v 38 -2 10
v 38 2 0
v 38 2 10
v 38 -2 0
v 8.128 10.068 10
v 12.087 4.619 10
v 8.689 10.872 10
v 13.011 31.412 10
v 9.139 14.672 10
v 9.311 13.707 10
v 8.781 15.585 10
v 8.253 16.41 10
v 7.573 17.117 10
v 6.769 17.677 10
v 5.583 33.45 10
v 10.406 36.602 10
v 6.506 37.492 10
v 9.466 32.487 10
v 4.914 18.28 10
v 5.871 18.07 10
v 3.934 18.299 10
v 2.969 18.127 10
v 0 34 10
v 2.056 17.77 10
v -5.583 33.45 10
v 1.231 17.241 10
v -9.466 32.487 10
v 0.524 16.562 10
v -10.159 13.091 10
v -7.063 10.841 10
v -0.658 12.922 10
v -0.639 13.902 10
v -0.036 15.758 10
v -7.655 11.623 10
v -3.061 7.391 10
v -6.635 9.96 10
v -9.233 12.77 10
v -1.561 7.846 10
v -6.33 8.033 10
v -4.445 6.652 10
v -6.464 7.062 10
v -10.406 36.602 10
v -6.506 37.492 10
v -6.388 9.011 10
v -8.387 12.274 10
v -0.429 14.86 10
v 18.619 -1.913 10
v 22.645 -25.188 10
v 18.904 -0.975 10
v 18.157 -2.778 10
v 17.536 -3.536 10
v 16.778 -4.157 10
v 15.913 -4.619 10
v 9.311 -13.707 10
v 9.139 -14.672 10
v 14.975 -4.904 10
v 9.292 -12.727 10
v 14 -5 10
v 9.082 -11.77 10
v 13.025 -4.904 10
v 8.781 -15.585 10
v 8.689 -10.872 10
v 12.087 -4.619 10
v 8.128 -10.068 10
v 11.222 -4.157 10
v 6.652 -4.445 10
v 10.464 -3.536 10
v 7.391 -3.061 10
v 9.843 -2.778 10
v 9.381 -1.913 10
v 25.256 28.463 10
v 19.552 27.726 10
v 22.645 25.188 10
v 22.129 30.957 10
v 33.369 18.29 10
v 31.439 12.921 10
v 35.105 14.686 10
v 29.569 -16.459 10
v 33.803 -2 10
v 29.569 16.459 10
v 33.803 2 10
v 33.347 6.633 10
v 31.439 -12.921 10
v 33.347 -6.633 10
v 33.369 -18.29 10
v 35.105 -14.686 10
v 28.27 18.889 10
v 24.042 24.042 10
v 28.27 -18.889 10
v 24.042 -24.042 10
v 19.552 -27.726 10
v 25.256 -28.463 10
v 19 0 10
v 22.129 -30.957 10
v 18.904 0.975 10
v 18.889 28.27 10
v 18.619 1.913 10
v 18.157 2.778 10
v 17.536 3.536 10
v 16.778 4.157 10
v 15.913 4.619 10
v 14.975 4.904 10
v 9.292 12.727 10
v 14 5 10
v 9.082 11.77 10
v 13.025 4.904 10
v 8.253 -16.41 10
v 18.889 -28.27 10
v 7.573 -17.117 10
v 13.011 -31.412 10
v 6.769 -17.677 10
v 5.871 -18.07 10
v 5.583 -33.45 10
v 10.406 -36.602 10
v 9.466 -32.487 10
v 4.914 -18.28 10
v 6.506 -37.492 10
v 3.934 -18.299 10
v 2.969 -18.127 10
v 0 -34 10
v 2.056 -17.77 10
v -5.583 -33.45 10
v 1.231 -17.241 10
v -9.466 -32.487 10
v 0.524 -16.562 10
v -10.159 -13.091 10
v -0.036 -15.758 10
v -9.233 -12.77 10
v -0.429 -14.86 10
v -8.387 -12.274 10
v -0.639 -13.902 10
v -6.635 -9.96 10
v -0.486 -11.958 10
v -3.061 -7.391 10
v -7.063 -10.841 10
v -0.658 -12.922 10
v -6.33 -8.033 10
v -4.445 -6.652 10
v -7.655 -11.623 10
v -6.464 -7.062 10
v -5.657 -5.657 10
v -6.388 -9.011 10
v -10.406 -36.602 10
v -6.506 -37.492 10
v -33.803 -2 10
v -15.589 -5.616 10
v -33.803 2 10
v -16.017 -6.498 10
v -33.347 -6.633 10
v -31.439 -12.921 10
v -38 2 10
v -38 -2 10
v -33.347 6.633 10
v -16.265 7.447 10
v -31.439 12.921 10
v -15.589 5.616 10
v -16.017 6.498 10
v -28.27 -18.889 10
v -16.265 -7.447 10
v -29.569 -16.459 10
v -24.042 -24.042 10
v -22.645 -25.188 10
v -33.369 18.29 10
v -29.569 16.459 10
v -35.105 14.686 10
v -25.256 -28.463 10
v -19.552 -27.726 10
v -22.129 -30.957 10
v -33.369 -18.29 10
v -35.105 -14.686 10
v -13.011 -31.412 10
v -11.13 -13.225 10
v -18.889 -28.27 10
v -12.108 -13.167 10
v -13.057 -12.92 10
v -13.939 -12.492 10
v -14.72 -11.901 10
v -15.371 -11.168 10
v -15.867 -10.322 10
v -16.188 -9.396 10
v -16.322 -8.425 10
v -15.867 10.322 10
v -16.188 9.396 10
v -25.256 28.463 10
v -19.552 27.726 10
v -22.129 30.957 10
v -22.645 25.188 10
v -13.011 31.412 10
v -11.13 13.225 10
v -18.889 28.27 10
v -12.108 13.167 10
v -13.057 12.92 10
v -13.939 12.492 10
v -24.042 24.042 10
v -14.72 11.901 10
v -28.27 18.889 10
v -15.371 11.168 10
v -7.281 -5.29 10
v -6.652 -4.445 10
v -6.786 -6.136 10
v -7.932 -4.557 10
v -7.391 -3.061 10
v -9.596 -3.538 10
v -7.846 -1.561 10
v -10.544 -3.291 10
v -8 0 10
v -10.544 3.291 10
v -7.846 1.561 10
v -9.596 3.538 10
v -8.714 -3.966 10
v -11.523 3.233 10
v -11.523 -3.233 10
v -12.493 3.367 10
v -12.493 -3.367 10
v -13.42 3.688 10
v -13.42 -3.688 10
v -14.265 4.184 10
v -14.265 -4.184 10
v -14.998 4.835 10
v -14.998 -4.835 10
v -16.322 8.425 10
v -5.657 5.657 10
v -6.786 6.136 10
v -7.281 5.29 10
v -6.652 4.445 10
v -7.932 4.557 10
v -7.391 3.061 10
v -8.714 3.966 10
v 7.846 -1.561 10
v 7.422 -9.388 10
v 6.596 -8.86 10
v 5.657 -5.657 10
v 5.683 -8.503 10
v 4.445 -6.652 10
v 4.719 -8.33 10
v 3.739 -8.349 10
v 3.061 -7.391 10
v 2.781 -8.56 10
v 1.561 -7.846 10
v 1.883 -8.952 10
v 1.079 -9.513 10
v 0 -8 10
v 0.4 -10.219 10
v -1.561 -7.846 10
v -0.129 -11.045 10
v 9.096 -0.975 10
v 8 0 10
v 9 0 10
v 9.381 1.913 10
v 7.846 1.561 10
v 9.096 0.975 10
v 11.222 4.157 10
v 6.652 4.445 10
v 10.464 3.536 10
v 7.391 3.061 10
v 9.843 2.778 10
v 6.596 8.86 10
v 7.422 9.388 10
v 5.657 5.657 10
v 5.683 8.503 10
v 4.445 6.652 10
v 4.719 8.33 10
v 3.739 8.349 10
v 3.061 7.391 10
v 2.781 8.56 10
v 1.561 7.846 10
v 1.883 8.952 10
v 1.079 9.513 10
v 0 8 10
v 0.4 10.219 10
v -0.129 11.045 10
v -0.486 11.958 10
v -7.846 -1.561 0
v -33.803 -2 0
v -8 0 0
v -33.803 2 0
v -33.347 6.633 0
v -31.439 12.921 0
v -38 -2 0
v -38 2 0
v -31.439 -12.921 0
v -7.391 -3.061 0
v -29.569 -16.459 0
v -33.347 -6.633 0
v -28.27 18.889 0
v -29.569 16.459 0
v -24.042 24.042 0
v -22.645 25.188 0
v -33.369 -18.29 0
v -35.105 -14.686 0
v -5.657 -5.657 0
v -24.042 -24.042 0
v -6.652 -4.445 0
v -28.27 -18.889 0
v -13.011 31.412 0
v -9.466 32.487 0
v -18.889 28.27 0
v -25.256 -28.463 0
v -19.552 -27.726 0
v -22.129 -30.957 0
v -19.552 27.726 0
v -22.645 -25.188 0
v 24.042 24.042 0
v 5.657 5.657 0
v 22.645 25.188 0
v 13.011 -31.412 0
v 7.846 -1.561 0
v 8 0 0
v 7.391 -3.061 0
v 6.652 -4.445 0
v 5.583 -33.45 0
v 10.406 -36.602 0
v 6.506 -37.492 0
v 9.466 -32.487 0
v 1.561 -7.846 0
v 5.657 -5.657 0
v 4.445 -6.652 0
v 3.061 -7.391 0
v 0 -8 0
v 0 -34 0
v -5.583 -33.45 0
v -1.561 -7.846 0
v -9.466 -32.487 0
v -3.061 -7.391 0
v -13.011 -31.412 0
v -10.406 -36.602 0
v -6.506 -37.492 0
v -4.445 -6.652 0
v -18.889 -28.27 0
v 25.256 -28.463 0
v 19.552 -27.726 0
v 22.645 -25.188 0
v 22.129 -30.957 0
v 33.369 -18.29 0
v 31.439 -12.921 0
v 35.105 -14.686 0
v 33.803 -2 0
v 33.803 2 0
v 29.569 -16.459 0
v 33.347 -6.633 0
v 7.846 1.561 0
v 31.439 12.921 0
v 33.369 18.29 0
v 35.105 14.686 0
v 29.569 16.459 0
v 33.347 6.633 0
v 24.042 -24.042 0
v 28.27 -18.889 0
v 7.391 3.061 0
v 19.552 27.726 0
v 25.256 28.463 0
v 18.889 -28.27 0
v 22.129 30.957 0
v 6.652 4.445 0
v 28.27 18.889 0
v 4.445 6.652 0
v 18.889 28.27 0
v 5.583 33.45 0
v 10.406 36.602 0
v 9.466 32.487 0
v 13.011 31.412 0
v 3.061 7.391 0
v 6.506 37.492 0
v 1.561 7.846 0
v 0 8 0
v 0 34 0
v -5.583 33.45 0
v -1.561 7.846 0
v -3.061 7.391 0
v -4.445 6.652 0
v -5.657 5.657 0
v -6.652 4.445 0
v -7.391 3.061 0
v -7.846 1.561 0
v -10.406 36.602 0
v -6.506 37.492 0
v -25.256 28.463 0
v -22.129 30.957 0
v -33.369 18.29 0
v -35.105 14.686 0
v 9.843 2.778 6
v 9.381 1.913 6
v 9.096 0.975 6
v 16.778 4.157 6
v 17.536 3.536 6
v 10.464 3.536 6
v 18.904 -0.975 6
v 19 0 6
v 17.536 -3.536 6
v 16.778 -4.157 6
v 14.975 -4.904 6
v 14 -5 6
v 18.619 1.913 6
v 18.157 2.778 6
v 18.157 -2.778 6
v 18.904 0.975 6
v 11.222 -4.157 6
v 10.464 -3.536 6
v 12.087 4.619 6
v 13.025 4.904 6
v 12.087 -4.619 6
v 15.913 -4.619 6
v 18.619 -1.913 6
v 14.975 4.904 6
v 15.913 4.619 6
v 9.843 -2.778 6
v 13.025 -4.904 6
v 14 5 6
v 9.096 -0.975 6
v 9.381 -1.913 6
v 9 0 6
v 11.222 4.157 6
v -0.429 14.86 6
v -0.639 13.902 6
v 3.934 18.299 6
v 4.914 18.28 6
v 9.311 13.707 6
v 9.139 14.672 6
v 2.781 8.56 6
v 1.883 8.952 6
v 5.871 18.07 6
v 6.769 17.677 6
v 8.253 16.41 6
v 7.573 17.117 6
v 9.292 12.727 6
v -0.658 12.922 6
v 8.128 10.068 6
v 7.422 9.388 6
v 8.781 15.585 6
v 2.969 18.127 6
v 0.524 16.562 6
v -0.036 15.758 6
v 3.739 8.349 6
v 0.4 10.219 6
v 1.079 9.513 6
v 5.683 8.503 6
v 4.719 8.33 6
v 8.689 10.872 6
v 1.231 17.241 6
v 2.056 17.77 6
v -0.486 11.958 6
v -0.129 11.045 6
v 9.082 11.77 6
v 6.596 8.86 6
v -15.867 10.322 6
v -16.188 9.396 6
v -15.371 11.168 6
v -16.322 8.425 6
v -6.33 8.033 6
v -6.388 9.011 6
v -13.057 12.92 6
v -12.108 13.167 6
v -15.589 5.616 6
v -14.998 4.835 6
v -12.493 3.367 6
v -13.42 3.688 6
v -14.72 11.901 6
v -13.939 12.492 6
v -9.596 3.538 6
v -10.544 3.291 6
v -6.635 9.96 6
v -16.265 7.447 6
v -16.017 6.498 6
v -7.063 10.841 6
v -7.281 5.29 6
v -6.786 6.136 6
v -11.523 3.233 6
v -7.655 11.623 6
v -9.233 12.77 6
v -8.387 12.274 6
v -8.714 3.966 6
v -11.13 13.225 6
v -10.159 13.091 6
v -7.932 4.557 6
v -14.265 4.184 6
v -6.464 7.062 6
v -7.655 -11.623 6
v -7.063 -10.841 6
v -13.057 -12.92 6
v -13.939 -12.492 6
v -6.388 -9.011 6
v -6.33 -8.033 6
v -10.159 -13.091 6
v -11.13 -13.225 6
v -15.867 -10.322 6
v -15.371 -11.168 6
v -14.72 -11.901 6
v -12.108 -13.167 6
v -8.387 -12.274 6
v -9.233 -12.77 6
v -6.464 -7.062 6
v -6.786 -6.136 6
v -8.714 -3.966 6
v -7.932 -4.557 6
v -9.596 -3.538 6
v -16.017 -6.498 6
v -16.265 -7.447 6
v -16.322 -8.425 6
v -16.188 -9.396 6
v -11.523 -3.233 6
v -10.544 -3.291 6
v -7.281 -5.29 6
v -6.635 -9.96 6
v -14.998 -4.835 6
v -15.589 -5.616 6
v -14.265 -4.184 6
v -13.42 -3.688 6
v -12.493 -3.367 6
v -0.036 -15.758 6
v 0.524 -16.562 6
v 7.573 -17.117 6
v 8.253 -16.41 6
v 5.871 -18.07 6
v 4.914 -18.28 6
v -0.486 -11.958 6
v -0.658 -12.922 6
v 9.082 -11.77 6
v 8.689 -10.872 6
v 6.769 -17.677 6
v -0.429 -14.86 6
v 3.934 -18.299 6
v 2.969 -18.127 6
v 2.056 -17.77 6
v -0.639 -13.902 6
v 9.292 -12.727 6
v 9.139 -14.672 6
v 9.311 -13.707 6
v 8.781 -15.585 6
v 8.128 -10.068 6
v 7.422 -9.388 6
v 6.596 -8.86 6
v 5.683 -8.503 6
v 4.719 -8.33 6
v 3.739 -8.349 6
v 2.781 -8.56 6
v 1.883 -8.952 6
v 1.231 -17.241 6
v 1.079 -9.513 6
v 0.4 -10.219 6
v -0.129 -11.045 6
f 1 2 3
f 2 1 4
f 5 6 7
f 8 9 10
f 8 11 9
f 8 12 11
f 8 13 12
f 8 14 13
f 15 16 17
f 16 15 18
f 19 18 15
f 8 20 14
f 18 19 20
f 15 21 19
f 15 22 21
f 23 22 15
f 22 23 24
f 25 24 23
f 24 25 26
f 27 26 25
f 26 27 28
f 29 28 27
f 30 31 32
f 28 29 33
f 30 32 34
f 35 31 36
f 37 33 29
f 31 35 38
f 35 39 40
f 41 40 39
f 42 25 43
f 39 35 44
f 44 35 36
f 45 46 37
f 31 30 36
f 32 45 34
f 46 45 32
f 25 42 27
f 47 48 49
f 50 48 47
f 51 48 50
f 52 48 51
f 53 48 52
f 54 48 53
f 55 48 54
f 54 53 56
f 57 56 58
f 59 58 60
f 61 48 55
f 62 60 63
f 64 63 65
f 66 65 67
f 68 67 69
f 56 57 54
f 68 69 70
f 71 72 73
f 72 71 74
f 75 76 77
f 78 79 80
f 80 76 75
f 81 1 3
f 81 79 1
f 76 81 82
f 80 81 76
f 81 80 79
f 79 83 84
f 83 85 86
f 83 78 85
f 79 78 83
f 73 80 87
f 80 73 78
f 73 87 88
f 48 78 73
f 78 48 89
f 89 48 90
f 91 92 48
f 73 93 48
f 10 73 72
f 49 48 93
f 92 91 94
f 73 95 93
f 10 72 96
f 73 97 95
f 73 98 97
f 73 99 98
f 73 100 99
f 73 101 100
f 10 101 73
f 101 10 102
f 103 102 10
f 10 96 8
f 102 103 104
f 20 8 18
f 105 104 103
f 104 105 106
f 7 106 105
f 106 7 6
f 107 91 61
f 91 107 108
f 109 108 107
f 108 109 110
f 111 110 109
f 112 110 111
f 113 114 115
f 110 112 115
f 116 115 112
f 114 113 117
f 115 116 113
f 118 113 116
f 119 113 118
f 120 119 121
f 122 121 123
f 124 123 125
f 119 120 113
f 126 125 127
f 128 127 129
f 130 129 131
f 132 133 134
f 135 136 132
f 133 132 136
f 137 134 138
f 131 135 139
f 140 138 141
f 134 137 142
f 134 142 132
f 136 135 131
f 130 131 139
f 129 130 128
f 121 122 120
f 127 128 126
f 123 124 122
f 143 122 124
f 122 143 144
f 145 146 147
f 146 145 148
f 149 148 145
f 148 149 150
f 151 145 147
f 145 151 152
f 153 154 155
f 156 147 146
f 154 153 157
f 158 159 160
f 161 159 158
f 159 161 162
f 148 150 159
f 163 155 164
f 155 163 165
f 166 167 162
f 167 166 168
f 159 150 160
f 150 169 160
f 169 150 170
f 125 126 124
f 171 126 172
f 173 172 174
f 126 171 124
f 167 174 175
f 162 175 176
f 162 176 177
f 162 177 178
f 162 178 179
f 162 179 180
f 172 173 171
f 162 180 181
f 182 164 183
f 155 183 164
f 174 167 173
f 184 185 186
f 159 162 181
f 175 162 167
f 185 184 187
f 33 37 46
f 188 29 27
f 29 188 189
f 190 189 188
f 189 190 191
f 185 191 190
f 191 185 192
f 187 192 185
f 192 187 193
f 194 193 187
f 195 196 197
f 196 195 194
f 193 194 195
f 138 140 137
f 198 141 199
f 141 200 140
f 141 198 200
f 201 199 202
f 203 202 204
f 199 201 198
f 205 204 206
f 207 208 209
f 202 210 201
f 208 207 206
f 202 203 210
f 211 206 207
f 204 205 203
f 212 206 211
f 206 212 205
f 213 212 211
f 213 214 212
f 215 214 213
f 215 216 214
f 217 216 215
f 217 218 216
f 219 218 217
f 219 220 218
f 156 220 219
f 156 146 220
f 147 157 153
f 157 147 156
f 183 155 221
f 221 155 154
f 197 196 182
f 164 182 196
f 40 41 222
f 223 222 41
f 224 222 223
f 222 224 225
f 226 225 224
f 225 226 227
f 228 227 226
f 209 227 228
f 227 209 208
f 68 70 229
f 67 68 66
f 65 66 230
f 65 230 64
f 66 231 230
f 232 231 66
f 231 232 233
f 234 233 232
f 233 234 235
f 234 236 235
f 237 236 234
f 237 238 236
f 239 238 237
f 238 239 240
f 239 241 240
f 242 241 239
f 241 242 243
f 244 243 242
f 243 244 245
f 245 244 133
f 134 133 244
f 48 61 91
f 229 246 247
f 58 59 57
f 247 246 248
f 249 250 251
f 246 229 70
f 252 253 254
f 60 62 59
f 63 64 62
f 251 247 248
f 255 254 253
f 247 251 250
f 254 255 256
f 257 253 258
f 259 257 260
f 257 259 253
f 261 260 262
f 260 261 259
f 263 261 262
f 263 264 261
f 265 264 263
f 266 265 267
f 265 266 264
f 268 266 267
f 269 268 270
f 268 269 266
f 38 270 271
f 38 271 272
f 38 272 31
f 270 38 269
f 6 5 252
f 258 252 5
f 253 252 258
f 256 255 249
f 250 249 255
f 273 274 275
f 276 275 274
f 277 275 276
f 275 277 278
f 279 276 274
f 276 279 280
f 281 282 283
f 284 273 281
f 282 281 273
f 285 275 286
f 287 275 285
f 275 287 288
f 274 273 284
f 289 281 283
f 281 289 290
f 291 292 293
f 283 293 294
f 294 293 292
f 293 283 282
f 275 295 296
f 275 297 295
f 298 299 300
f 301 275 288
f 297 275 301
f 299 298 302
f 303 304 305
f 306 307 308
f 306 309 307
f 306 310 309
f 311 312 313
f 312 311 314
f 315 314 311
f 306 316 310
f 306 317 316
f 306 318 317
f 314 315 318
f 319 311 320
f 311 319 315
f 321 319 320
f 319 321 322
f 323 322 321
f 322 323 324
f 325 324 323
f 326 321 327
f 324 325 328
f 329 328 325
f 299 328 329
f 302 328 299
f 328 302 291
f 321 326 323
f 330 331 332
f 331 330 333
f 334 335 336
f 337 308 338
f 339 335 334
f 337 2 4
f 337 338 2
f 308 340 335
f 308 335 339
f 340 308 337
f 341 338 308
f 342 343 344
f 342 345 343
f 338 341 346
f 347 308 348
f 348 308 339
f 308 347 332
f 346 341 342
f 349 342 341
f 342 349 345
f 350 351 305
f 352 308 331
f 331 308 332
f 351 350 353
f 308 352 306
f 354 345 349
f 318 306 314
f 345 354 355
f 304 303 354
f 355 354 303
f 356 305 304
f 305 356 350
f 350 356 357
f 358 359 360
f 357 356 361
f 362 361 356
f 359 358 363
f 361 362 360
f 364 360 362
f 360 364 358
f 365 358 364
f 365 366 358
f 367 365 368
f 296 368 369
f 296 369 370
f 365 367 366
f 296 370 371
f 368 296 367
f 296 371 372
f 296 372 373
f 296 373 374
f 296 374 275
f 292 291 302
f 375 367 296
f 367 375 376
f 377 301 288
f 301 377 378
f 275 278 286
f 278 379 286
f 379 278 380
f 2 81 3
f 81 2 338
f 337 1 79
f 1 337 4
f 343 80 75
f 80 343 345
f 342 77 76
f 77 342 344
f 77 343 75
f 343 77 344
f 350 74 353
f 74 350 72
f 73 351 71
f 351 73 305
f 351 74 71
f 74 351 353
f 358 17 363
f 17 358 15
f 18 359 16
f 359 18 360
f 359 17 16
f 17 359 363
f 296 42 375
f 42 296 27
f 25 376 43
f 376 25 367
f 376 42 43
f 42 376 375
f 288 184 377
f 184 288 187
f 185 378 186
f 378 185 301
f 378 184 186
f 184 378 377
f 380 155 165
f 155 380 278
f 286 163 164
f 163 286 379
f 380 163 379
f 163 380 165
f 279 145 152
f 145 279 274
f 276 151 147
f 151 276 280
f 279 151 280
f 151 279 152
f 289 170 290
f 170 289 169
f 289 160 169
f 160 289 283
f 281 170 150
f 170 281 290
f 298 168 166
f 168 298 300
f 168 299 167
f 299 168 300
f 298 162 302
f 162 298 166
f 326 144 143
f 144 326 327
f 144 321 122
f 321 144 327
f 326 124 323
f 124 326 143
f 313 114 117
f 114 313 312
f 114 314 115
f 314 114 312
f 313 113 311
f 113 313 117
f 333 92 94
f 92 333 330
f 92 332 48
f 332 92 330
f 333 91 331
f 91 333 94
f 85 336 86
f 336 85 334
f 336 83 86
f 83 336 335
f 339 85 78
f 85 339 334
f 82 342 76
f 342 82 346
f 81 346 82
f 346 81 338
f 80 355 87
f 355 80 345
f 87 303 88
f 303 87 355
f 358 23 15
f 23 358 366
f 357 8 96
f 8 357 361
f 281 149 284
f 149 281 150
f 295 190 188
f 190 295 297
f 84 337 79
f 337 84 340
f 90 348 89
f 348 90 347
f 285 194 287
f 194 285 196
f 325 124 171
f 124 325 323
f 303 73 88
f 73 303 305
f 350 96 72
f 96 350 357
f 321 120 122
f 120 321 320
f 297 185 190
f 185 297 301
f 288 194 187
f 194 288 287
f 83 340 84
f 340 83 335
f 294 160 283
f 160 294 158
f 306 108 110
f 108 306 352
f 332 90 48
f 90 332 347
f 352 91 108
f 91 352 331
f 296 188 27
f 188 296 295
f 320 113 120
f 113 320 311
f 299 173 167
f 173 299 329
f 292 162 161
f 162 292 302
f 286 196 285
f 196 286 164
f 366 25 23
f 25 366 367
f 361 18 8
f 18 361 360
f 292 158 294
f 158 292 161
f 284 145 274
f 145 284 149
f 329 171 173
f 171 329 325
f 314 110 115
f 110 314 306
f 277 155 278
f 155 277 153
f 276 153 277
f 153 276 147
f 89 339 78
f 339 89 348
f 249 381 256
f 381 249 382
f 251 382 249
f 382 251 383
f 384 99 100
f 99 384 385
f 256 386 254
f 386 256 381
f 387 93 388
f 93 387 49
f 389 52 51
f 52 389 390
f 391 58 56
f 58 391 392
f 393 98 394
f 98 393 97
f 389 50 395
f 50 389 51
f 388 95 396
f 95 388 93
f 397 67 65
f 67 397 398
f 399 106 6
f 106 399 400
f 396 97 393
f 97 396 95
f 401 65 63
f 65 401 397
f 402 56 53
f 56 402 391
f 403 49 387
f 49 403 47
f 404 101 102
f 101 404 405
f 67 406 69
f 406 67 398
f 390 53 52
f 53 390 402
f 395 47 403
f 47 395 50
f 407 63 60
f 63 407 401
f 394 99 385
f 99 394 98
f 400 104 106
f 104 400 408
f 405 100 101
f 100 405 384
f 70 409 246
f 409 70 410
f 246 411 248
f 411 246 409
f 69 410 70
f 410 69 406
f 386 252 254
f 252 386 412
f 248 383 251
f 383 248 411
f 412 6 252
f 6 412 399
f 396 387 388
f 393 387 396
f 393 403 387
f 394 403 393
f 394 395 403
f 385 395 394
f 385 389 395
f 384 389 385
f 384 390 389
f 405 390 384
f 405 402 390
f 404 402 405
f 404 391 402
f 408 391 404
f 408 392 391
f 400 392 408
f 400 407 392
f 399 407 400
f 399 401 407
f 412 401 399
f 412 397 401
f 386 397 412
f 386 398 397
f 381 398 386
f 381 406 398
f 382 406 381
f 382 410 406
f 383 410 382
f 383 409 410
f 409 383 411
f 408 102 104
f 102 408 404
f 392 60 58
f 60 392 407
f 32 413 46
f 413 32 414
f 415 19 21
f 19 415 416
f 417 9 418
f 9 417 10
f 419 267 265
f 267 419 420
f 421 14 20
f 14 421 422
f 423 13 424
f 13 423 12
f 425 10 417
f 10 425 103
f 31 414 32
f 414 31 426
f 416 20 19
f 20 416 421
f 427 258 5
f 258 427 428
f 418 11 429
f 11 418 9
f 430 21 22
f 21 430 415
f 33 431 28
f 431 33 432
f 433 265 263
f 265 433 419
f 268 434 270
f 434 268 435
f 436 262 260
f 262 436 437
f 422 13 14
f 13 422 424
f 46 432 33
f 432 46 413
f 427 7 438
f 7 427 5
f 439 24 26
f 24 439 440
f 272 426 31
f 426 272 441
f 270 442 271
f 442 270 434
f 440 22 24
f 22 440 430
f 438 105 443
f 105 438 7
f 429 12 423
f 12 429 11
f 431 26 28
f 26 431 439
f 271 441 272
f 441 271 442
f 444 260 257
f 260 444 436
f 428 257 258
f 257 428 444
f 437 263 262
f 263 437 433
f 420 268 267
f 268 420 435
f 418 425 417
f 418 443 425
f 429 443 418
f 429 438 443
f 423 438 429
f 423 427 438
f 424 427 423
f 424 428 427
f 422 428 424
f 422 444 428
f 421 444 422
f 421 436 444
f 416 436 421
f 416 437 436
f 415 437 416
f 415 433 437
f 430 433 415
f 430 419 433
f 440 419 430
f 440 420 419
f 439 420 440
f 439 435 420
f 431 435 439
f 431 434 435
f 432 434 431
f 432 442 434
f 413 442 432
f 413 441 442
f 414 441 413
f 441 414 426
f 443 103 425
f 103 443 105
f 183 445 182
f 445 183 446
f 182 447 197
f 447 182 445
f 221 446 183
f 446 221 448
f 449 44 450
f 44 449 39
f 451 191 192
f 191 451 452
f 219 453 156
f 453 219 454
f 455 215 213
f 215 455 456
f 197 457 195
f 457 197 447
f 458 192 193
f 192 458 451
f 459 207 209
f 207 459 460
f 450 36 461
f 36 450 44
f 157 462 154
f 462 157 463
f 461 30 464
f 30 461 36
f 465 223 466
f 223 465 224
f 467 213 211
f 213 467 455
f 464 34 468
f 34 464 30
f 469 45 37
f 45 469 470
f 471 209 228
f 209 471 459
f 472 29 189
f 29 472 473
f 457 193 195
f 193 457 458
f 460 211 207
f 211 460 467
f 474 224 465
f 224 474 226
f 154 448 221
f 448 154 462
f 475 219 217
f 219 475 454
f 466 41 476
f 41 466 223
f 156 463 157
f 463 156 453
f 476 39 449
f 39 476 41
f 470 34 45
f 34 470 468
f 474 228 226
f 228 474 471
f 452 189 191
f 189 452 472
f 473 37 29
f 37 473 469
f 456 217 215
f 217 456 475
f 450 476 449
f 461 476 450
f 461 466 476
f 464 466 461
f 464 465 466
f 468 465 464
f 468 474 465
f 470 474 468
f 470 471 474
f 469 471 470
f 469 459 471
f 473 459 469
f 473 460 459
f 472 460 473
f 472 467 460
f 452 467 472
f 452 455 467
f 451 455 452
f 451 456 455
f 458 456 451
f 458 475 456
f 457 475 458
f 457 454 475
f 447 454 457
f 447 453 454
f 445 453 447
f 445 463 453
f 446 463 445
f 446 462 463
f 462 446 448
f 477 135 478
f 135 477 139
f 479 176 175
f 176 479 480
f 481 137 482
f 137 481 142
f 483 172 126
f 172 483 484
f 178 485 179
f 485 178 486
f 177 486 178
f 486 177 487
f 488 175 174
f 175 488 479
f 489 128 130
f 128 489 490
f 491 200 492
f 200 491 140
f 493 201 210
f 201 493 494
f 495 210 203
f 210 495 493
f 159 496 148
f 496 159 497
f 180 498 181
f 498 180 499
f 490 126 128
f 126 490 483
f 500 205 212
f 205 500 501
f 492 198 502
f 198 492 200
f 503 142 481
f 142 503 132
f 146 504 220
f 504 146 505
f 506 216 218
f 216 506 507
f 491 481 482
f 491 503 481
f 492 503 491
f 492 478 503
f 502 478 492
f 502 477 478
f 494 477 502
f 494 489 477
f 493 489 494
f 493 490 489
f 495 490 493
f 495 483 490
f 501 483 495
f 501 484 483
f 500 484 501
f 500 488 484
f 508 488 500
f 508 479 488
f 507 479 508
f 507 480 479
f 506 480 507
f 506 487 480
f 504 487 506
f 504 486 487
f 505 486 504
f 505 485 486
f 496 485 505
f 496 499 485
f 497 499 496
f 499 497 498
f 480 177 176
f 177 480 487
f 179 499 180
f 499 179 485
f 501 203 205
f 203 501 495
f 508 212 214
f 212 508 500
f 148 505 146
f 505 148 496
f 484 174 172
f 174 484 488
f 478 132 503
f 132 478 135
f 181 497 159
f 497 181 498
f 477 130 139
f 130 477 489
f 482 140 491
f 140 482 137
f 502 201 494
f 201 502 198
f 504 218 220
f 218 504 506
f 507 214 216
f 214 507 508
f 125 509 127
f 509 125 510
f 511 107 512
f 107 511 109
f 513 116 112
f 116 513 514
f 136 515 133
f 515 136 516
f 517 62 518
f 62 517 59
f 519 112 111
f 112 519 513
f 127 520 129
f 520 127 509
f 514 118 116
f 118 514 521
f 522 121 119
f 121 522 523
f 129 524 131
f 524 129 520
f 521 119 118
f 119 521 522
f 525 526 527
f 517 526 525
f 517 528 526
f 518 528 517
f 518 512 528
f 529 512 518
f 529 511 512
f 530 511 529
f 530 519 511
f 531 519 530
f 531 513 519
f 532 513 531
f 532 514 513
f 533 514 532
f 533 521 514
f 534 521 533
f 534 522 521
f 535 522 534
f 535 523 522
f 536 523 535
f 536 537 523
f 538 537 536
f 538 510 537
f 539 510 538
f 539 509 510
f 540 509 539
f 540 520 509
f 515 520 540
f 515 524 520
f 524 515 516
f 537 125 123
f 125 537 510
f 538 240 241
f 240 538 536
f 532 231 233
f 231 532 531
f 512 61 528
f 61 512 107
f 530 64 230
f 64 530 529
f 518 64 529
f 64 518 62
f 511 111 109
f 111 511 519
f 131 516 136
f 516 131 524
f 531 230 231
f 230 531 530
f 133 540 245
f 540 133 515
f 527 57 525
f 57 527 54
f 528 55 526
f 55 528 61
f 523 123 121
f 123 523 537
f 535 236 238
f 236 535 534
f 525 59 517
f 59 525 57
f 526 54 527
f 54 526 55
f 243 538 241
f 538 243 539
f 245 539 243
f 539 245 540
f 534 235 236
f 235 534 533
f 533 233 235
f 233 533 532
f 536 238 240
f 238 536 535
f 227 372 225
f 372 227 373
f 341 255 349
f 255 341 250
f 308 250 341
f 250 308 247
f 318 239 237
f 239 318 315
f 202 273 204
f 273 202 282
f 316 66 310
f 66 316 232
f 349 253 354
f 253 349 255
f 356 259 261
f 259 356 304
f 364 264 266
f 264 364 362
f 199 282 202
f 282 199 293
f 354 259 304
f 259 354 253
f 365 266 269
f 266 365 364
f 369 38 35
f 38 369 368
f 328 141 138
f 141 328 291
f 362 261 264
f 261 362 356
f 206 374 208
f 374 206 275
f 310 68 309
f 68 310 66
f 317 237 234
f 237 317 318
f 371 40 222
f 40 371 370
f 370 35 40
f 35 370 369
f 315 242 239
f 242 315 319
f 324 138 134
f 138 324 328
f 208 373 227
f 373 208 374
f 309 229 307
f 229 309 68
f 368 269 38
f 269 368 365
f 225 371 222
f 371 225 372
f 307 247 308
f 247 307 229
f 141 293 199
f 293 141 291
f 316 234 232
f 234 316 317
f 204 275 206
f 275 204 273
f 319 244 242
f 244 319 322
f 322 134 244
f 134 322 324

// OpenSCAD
$fn = 32;

// ----------------------------------------------------------------------
// Spur blank: lightened gear blank
// ----------------------------------------------------------------------

// --- parameters (mm) ---
disc_r = 34;              // blank root radius
disc_t = 10;              // blank thickness
n_teeth = 14;             // stub tooth count
tooth_w = 4;              // tooth width at the root
tooth_h = 4;              // tooth height above the root
bore_r = 8;               // central bore radius
ring_r = 14;              // lightening pocket ring radius
pocket_r = 5;             // lightening pocket radius
fit_tol = 0.1;            // tolerance for press fits, mm
free_tol = 0.3;           // tolerance for clearance fits, mm

out_r = disc_r + tooth_h;  // tip radius
bbox_x = 76.0;  // measured width over the teeth
bbox_y = 74.98;  // measured depth over the teeth

difference() {
union() {
  cylinder(r = disc_r, h = disc_t);
  for (i = [0 : n_teeth - 1])
    rotate([0, 0, i * 360 / n_teeth])
      translate([disc_r - 1, -tooth_w / 2, 0])
        cube([tooth_h + 1, tooth_w, disc_t]);
}
  translate([0, 0, -1]) cylinder(r = bore_r, h = disc_t + 2);
  for (i = [0 : 5])
    rotate([0, 0, i * 72])
      translate([ring_r, 0, disc_t - 4])
        cylinder(r = pocket_r, h = 5);
}
